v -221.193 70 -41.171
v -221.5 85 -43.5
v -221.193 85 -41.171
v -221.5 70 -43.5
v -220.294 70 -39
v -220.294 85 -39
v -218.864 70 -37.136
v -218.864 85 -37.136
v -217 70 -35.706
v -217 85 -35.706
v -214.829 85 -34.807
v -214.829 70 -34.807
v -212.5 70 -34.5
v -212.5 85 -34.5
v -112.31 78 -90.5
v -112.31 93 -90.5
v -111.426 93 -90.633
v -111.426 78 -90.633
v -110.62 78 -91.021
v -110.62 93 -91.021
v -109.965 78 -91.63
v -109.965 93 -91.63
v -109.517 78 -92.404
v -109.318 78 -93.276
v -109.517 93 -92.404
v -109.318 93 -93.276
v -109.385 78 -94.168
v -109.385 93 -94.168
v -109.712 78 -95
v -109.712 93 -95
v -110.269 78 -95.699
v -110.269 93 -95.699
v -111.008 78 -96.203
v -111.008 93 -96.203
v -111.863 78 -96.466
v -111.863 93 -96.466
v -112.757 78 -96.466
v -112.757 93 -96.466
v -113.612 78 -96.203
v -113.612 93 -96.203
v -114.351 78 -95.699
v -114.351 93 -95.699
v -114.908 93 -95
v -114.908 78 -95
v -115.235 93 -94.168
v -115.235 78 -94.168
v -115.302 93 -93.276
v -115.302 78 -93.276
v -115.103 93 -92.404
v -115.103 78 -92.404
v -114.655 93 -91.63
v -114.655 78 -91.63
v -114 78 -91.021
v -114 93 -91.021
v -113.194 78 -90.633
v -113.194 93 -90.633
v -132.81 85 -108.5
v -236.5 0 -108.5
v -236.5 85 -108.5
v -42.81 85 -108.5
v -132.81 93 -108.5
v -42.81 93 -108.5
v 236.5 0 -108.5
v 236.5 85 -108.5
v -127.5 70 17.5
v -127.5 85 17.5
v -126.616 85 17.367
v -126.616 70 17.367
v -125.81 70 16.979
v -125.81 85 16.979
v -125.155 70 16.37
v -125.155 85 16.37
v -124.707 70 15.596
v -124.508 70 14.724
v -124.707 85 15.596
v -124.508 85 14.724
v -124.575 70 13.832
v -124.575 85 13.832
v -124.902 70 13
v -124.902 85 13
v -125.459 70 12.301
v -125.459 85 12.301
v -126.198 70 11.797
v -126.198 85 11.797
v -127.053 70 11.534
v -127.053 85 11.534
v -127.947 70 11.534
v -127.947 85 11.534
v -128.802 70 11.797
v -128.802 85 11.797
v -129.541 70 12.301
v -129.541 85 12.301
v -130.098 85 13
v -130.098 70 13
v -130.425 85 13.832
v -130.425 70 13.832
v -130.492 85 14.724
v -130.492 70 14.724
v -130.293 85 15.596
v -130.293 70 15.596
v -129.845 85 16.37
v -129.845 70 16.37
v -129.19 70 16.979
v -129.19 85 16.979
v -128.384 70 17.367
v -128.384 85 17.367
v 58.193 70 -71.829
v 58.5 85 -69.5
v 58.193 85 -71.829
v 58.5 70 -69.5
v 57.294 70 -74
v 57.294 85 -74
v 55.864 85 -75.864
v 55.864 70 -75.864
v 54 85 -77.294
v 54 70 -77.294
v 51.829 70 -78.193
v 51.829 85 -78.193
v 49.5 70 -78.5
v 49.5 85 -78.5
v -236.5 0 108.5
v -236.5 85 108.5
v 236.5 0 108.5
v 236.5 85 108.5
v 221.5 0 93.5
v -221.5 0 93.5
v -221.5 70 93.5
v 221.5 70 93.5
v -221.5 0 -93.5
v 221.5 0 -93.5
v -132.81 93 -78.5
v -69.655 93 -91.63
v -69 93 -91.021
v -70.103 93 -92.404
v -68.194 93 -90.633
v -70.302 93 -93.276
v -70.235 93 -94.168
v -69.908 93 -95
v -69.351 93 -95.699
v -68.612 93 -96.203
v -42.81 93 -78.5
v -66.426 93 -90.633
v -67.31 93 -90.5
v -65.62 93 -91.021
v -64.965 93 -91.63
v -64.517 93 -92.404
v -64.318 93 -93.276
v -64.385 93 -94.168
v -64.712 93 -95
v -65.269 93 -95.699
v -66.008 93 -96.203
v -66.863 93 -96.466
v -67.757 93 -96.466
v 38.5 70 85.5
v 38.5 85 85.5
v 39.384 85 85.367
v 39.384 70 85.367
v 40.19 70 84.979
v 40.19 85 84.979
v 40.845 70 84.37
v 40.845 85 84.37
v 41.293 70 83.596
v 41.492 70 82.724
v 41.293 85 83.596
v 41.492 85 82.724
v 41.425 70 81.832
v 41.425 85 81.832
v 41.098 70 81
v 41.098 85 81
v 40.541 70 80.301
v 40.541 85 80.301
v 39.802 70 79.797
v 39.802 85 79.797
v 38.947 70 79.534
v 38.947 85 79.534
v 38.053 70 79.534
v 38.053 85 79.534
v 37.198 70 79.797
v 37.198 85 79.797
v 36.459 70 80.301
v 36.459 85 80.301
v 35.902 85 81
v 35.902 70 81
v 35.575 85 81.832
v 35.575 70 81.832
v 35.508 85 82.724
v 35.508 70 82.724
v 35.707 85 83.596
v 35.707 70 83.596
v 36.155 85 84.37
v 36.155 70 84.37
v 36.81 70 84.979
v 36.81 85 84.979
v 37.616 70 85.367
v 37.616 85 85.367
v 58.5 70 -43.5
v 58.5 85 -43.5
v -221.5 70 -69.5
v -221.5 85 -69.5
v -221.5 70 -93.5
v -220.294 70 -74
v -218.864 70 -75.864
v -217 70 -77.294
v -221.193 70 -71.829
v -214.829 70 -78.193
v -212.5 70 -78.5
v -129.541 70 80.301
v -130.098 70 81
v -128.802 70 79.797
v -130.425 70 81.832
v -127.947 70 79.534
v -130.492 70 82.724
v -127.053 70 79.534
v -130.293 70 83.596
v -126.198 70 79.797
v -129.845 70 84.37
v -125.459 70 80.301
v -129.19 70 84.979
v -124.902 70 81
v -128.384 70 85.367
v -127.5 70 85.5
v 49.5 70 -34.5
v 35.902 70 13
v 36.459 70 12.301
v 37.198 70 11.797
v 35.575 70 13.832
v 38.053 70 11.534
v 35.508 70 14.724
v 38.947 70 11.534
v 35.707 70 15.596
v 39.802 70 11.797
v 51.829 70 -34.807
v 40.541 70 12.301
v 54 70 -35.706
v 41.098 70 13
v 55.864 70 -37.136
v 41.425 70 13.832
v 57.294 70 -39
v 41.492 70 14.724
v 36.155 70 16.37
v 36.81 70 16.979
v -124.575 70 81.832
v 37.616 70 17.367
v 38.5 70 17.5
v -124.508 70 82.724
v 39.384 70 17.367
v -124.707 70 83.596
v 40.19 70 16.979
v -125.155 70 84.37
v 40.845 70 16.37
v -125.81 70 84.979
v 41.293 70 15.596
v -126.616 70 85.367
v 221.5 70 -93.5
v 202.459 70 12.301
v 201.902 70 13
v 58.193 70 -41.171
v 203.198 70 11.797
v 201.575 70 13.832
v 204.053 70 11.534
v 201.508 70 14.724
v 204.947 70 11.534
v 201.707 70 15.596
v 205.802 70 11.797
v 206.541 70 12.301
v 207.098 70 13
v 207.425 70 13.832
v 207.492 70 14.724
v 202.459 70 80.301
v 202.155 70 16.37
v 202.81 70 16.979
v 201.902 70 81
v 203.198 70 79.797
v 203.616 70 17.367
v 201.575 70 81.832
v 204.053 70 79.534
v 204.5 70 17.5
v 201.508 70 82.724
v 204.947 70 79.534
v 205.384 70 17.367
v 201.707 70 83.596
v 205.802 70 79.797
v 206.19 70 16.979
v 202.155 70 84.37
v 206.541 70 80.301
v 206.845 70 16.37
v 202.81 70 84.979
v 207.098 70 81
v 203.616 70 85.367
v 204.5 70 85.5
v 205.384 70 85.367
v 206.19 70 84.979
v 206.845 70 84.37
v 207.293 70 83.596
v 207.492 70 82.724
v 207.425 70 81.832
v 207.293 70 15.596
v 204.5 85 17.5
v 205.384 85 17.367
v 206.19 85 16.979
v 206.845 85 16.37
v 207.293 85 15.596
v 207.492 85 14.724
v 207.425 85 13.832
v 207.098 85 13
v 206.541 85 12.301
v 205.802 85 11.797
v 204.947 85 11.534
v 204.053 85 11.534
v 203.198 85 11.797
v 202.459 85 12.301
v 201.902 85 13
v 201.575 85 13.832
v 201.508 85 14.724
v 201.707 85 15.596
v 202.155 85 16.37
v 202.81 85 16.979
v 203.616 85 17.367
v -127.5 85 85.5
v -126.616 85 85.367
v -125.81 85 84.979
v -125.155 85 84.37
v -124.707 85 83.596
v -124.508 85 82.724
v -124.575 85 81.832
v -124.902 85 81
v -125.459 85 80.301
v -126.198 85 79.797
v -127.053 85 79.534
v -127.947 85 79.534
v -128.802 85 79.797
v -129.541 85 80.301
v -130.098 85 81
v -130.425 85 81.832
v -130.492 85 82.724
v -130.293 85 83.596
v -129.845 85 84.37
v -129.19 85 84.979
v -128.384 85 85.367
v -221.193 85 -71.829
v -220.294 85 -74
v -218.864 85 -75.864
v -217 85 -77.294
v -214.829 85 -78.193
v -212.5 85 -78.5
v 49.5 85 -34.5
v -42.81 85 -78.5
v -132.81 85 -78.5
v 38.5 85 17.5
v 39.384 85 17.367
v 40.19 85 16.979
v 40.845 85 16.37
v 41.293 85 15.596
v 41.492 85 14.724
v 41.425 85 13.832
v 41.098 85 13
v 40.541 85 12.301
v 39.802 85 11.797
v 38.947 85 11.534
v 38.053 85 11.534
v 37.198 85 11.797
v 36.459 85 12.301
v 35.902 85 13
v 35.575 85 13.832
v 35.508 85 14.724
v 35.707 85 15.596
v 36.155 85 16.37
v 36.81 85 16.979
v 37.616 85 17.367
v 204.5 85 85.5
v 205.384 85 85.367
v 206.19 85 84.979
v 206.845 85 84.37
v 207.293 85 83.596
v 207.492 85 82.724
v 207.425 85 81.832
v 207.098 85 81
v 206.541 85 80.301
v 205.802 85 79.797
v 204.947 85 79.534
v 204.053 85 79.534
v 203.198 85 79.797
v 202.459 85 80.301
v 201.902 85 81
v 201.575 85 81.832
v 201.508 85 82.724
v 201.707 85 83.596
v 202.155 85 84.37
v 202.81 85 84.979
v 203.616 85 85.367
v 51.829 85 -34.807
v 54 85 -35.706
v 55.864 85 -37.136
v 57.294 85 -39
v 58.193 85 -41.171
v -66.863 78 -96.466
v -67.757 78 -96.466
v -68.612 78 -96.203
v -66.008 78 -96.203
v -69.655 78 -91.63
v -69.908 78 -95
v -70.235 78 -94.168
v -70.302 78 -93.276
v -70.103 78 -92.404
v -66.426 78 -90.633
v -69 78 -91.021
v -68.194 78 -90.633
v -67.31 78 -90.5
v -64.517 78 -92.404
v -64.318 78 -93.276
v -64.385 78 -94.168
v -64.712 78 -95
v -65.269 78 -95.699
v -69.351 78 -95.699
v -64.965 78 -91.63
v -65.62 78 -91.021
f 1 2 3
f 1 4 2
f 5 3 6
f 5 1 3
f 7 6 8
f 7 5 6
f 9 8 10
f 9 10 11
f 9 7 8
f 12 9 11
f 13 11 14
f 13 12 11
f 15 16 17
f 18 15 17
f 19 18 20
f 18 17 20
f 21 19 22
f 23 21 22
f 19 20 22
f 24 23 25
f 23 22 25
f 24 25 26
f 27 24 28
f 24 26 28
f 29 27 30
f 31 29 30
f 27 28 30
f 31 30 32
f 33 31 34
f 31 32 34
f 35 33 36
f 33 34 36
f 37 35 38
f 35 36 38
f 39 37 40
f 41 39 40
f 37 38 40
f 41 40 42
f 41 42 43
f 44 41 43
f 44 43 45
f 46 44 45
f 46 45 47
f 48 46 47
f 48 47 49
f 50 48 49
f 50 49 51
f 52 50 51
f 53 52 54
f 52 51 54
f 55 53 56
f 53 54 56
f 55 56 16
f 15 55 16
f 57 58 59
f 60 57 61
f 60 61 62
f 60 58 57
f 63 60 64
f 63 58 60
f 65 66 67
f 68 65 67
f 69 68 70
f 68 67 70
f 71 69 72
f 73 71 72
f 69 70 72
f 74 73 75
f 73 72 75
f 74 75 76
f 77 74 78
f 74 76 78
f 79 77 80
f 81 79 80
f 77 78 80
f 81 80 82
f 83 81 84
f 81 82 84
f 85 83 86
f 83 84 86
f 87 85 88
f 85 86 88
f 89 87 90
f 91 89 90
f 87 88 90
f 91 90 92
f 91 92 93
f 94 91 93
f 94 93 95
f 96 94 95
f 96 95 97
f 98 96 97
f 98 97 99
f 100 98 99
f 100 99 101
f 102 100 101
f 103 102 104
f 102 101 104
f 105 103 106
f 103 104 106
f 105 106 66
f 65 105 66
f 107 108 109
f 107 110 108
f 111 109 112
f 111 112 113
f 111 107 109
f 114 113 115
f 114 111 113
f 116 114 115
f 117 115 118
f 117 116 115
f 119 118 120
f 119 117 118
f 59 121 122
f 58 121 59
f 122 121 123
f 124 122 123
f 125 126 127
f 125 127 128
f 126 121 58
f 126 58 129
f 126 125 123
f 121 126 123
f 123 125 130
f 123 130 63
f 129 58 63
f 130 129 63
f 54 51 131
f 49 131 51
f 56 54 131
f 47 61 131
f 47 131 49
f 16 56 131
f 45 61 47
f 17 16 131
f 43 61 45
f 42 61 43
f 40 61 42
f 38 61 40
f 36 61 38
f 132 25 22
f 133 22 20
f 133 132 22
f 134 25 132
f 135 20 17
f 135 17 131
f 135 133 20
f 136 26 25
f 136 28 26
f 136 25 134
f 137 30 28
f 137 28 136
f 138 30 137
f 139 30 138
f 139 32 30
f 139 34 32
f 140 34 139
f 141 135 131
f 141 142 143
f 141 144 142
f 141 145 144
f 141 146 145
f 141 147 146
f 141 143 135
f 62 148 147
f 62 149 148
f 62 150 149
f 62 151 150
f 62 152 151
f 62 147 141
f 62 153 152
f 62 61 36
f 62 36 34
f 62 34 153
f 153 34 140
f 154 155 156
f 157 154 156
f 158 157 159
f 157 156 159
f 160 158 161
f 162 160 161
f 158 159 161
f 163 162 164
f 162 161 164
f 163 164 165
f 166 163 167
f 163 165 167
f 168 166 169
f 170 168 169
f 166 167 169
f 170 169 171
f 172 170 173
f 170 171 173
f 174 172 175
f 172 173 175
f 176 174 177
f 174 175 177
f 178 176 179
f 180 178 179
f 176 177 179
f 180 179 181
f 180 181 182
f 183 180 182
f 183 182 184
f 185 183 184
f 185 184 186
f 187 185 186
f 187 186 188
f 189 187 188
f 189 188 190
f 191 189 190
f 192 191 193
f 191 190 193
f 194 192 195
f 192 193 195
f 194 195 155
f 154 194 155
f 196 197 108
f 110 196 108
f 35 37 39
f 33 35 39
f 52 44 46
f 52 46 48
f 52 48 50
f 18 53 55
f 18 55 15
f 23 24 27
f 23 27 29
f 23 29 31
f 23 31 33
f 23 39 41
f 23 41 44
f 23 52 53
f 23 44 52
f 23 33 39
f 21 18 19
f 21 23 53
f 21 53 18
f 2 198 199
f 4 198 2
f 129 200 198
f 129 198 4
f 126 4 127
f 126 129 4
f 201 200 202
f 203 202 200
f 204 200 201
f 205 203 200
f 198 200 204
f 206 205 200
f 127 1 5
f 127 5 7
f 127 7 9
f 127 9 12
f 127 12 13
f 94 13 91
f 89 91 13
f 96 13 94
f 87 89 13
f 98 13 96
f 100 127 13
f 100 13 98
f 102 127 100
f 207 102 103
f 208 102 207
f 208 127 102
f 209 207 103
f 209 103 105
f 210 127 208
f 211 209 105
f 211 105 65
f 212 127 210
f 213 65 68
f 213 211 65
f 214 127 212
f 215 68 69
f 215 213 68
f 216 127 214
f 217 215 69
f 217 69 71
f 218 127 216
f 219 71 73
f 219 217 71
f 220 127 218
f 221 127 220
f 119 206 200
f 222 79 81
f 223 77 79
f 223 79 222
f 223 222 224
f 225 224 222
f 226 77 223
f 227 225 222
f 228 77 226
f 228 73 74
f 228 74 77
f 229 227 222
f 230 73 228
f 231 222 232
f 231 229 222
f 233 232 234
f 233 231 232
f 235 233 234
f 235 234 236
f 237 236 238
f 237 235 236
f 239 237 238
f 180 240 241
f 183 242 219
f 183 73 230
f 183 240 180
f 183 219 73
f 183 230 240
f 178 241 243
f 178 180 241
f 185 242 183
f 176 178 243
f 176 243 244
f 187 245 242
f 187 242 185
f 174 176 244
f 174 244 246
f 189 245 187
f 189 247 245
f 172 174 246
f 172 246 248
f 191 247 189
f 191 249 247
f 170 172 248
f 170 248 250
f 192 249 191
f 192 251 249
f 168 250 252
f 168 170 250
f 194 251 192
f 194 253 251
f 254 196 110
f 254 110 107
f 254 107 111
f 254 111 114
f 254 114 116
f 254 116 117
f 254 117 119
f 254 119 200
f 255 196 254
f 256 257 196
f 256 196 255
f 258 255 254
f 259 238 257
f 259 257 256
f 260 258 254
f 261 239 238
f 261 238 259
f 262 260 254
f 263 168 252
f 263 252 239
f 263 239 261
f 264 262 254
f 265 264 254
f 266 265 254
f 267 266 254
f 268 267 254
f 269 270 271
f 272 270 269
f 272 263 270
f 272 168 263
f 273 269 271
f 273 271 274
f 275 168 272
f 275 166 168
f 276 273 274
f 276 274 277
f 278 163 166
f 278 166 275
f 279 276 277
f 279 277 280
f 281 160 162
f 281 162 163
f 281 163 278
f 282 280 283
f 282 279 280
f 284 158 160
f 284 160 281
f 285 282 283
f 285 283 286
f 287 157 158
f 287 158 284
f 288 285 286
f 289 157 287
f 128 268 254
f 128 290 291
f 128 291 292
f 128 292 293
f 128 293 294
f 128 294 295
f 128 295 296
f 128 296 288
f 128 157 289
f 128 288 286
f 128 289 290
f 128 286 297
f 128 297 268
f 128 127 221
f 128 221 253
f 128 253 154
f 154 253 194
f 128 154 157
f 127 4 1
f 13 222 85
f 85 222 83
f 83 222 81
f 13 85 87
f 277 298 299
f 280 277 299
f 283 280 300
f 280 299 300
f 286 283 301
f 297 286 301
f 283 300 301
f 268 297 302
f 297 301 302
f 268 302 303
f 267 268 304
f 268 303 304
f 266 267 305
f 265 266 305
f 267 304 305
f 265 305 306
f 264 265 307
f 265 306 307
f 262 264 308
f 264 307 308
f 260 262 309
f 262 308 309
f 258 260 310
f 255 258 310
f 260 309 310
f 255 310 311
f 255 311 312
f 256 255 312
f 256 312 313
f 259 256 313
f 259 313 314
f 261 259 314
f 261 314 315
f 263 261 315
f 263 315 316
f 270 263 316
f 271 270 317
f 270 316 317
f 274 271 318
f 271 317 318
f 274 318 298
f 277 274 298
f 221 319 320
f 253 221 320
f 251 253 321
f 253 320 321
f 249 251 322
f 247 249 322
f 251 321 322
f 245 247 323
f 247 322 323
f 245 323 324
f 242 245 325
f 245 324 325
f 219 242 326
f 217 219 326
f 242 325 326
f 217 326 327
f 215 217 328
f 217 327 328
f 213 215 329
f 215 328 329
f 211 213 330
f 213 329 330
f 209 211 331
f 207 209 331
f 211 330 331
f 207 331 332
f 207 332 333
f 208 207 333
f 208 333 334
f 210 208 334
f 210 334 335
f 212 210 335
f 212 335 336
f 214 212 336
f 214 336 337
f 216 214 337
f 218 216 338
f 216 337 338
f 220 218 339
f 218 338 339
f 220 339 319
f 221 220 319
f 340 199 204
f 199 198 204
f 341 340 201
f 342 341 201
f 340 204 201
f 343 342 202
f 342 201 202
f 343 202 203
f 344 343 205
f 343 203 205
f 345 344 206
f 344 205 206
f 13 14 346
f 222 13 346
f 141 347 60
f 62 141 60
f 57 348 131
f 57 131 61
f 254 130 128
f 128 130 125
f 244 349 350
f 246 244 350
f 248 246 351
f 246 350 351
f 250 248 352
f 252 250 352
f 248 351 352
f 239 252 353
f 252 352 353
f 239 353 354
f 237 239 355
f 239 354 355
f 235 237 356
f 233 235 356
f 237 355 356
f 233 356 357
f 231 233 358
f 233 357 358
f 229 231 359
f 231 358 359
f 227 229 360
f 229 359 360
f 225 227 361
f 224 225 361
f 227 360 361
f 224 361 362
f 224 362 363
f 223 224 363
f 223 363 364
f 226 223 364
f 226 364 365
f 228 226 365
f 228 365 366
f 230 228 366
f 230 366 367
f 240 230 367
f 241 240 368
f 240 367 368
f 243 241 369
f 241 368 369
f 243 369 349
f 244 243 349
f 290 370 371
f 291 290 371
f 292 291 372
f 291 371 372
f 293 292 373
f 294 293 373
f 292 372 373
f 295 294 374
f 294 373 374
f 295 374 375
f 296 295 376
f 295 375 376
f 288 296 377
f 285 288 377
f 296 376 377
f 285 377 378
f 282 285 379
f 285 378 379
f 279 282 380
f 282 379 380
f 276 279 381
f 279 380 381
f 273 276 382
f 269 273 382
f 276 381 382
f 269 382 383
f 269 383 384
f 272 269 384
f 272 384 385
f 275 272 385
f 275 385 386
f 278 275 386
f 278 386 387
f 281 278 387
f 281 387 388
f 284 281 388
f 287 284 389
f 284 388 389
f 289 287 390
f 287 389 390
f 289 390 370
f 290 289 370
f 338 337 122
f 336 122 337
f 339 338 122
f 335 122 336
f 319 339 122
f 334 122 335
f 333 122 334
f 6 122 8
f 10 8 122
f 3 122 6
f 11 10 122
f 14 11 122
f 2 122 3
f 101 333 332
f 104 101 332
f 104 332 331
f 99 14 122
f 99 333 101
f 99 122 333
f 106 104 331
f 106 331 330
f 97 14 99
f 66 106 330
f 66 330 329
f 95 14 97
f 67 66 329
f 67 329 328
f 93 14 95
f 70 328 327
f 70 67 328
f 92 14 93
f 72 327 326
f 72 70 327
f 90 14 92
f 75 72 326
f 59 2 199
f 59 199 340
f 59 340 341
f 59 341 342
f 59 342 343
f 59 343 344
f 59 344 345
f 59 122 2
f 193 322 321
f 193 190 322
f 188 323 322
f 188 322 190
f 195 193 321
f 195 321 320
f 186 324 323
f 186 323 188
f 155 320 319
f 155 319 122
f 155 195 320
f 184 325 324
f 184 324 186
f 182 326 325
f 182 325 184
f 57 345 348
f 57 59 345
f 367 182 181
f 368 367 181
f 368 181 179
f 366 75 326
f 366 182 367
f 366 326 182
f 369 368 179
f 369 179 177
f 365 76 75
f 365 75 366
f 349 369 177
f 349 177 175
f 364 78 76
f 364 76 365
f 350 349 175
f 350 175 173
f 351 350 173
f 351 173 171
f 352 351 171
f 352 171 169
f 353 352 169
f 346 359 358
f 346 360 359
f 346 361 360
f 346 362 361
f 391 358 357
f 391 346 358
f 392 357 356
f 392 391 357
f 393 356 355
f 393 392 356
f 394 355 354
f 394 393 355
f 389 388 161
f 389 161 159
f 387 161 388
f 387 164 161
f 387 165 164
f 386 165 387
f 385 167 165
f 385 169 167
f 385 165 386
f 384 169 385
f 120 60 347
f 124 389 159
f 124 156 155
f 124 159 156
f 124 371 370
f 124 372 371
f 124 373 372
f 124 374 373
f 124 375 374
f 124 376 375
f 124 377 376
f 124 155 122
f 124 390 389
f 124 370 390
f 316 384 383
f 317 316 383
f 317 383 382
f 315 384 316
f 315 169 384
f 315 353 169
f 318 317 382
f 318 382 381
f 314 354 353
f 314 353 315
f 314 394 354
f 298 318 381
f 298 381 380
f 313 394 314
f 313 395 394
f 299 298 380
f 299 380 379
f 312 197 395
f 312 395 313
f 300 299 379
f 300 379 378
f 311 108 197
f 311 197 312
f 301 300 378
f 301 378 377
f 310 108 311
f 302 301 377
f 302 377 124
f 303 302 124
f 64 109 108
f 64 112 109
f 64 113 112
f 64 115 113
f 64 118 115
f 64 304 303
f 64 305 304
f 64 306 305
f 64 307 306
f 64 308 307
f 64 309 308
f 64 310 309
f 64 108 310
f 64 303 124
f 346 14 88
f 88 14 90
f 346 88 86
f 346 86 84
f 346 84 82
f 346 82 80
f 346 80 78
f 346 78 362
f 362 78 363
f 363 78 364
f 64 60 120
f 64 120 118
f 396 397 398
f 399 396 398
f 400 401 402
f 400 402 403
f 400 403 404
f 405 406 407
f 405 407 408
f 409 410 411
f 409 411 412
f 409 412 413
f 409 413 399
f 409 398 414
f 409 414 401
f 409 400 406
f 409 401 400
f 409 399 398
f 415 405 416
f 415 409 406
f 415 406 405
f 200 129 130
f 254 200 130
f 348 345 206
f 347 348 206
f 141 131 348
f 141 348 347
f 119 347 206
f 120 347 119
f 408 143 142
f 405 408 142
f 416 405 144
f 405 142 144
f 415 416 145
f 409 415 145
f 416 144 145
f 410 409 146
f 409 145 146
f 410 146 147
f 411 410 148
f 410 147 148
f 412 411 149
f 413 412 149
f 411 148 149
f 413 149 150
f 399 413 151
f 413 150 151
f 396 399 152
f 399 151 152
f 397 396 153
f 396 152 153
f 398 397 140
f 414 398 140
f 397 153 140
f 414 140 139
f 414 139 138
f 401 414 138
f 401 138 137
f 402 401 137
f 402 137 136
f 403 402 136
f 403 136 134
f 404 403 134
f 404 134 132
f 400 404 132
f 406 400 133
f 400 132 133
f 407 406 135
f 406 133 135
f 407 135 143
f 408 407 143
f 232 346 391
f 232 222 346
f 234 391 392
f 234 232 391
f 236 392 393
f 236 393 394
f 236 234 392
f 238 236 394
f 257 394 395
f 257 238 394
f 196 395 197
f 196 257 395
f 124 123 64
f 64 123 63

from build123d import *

# Parameters (mm, degrees)
SKETCH1_W           = 473
SKETCH1_H           = 217
BOSS_EXTRUDE1_DEPTH = 85
SKETCH2_W           = 280
SKETCH2_H           = 44
CUT_EXTRUDE1_DEPTH  = 15
SKETCH3_W           = 443
SKETCH3_H           = 187
CUT_EXTRUDE2_DEPTH  = 70
FILLET1_R           = 9
SKETCH4_W           = 90
SKETCH4_H           = 30
BOSS_EXTRUDE2_DEPTH = 8
SKETCH5_R           = 3
CUT_EXTRUDE3_DEPTH  = 15
SKETCH6_R           = 3
CUT_EXTRUDE4_DEPTH  = 15


with BuildPart() as part:
    # Sketch1 → Boss-Extrude1 (new body)
    with BuildSketch(Plane(origin=(0, 0, 0), x_dir=(1, 0, 0), z_dir=(0, 1, 0))):
        Rectangle(SKETCH1_W, SKETCH1_H)
    extrude(amount=BOSS_EXTRUDE1_DEPTH)

    # Sketch2 → Cut-Extrude1 (cut)
    with BuildSketch(Plane(origin=(0, 85, 0), x_dir=(1, 0, 0), z_dir=(0, 1, 0))):
        with Locations((-81.5, 56.5)):
            Rectangle(SKETCH2_W, SKETCH2_H)
    extrude(amount=-CUT_EXTRUDE1_DEPTH, mode=Mode.SUBTRACT)

    # Sketch3 → Cut-Extrude2 (cut)
    with BuildSketch(Plane.XZ):
        Rectangle(SKETCH3_W, SKETCH3_H)
    extrude(amount=-CUT_EXTRUDE2_DEPTH, mode=Mode.SUBTRACT)

    # Fillet1
    fillet1_edges = [part.edges().sort_by_distance(p)[0] for p in [
        (-221.5, 77.5, -34.5),
        (-221.5, 77.5, -78.5),
        (58.5, 77.5, -78.5),
        (58.5, 77.5, -34.5),
    ]]
    fillet(fillet1_edges, radius=FILLET1_R)

    # Sketch4 → Boss-Extrude2 (add)
    with BuildSketch(Plane(origin=(0, 85, 0), x_dir=(1, 0, 0), z_dir=(0, 1, 0))):
        with Locations((-87.81, 93.5)):
            Rectangle(SKETCH4_W, SKETCH4_H)
    extrude(amount=BOSS_EXTRUDE2_DEPTH)

    # Sketch5 → Cut-Extrude3 (cut)
    with BuildSketch(Plane(origin=(0, 93, 0), x_dir=(1, 0, 0), z_dir=(0, 1, 0))):
        with Locations(Location((-112.31, 93.5, 0), (0, 0, 270))):
            Circle(SKETCH5_R)
        with Locations(Location((-67.31, 93.5, 0), (0, 0, 270))):
            Circle(SKETCH5_R)
    extrude(amount=-CUT_EXTRUDE3_DEPTH, mode=Mode.SUBTRACT)

    # Sketch6 → Cut-Extrude4 (cut)
    with BuildSketch(Plane(origin=(0, 85, 0), x_dir=(1, 0, 0), z_dir=(0, 1, 0))):
        with Locations(Location((-127.5, -82.5, 0), (0, 0, 270))):
            Circle(SKETCH6_R)
        with Locations(Location((-127.5, -14.5, 0), (0, 0, 270))):
            Circle(SKETCH6_R)
        with Locations(Location((38.5, -14.5, 0), (0, 0, 270))):
            Circle(SKETCH6_R)
        with Locations(Location((204.5, -14.5, 0), (0, 0, 270))):
            Circle(SKETCH6_R)
        with Locations(Location((204.5, -82.5, 0), (0, 0, 270))):
            Circle(SKETCH6_R)
        with Locations(Location((38.5, -82.5, 0), (0, 0, 270))):
            Circle(SKETCH6_R)
    extrude(amount=-CUT_EXTRUDE4_DEPTH, mode=Mode.SUBTRACT)


solid = part.part
